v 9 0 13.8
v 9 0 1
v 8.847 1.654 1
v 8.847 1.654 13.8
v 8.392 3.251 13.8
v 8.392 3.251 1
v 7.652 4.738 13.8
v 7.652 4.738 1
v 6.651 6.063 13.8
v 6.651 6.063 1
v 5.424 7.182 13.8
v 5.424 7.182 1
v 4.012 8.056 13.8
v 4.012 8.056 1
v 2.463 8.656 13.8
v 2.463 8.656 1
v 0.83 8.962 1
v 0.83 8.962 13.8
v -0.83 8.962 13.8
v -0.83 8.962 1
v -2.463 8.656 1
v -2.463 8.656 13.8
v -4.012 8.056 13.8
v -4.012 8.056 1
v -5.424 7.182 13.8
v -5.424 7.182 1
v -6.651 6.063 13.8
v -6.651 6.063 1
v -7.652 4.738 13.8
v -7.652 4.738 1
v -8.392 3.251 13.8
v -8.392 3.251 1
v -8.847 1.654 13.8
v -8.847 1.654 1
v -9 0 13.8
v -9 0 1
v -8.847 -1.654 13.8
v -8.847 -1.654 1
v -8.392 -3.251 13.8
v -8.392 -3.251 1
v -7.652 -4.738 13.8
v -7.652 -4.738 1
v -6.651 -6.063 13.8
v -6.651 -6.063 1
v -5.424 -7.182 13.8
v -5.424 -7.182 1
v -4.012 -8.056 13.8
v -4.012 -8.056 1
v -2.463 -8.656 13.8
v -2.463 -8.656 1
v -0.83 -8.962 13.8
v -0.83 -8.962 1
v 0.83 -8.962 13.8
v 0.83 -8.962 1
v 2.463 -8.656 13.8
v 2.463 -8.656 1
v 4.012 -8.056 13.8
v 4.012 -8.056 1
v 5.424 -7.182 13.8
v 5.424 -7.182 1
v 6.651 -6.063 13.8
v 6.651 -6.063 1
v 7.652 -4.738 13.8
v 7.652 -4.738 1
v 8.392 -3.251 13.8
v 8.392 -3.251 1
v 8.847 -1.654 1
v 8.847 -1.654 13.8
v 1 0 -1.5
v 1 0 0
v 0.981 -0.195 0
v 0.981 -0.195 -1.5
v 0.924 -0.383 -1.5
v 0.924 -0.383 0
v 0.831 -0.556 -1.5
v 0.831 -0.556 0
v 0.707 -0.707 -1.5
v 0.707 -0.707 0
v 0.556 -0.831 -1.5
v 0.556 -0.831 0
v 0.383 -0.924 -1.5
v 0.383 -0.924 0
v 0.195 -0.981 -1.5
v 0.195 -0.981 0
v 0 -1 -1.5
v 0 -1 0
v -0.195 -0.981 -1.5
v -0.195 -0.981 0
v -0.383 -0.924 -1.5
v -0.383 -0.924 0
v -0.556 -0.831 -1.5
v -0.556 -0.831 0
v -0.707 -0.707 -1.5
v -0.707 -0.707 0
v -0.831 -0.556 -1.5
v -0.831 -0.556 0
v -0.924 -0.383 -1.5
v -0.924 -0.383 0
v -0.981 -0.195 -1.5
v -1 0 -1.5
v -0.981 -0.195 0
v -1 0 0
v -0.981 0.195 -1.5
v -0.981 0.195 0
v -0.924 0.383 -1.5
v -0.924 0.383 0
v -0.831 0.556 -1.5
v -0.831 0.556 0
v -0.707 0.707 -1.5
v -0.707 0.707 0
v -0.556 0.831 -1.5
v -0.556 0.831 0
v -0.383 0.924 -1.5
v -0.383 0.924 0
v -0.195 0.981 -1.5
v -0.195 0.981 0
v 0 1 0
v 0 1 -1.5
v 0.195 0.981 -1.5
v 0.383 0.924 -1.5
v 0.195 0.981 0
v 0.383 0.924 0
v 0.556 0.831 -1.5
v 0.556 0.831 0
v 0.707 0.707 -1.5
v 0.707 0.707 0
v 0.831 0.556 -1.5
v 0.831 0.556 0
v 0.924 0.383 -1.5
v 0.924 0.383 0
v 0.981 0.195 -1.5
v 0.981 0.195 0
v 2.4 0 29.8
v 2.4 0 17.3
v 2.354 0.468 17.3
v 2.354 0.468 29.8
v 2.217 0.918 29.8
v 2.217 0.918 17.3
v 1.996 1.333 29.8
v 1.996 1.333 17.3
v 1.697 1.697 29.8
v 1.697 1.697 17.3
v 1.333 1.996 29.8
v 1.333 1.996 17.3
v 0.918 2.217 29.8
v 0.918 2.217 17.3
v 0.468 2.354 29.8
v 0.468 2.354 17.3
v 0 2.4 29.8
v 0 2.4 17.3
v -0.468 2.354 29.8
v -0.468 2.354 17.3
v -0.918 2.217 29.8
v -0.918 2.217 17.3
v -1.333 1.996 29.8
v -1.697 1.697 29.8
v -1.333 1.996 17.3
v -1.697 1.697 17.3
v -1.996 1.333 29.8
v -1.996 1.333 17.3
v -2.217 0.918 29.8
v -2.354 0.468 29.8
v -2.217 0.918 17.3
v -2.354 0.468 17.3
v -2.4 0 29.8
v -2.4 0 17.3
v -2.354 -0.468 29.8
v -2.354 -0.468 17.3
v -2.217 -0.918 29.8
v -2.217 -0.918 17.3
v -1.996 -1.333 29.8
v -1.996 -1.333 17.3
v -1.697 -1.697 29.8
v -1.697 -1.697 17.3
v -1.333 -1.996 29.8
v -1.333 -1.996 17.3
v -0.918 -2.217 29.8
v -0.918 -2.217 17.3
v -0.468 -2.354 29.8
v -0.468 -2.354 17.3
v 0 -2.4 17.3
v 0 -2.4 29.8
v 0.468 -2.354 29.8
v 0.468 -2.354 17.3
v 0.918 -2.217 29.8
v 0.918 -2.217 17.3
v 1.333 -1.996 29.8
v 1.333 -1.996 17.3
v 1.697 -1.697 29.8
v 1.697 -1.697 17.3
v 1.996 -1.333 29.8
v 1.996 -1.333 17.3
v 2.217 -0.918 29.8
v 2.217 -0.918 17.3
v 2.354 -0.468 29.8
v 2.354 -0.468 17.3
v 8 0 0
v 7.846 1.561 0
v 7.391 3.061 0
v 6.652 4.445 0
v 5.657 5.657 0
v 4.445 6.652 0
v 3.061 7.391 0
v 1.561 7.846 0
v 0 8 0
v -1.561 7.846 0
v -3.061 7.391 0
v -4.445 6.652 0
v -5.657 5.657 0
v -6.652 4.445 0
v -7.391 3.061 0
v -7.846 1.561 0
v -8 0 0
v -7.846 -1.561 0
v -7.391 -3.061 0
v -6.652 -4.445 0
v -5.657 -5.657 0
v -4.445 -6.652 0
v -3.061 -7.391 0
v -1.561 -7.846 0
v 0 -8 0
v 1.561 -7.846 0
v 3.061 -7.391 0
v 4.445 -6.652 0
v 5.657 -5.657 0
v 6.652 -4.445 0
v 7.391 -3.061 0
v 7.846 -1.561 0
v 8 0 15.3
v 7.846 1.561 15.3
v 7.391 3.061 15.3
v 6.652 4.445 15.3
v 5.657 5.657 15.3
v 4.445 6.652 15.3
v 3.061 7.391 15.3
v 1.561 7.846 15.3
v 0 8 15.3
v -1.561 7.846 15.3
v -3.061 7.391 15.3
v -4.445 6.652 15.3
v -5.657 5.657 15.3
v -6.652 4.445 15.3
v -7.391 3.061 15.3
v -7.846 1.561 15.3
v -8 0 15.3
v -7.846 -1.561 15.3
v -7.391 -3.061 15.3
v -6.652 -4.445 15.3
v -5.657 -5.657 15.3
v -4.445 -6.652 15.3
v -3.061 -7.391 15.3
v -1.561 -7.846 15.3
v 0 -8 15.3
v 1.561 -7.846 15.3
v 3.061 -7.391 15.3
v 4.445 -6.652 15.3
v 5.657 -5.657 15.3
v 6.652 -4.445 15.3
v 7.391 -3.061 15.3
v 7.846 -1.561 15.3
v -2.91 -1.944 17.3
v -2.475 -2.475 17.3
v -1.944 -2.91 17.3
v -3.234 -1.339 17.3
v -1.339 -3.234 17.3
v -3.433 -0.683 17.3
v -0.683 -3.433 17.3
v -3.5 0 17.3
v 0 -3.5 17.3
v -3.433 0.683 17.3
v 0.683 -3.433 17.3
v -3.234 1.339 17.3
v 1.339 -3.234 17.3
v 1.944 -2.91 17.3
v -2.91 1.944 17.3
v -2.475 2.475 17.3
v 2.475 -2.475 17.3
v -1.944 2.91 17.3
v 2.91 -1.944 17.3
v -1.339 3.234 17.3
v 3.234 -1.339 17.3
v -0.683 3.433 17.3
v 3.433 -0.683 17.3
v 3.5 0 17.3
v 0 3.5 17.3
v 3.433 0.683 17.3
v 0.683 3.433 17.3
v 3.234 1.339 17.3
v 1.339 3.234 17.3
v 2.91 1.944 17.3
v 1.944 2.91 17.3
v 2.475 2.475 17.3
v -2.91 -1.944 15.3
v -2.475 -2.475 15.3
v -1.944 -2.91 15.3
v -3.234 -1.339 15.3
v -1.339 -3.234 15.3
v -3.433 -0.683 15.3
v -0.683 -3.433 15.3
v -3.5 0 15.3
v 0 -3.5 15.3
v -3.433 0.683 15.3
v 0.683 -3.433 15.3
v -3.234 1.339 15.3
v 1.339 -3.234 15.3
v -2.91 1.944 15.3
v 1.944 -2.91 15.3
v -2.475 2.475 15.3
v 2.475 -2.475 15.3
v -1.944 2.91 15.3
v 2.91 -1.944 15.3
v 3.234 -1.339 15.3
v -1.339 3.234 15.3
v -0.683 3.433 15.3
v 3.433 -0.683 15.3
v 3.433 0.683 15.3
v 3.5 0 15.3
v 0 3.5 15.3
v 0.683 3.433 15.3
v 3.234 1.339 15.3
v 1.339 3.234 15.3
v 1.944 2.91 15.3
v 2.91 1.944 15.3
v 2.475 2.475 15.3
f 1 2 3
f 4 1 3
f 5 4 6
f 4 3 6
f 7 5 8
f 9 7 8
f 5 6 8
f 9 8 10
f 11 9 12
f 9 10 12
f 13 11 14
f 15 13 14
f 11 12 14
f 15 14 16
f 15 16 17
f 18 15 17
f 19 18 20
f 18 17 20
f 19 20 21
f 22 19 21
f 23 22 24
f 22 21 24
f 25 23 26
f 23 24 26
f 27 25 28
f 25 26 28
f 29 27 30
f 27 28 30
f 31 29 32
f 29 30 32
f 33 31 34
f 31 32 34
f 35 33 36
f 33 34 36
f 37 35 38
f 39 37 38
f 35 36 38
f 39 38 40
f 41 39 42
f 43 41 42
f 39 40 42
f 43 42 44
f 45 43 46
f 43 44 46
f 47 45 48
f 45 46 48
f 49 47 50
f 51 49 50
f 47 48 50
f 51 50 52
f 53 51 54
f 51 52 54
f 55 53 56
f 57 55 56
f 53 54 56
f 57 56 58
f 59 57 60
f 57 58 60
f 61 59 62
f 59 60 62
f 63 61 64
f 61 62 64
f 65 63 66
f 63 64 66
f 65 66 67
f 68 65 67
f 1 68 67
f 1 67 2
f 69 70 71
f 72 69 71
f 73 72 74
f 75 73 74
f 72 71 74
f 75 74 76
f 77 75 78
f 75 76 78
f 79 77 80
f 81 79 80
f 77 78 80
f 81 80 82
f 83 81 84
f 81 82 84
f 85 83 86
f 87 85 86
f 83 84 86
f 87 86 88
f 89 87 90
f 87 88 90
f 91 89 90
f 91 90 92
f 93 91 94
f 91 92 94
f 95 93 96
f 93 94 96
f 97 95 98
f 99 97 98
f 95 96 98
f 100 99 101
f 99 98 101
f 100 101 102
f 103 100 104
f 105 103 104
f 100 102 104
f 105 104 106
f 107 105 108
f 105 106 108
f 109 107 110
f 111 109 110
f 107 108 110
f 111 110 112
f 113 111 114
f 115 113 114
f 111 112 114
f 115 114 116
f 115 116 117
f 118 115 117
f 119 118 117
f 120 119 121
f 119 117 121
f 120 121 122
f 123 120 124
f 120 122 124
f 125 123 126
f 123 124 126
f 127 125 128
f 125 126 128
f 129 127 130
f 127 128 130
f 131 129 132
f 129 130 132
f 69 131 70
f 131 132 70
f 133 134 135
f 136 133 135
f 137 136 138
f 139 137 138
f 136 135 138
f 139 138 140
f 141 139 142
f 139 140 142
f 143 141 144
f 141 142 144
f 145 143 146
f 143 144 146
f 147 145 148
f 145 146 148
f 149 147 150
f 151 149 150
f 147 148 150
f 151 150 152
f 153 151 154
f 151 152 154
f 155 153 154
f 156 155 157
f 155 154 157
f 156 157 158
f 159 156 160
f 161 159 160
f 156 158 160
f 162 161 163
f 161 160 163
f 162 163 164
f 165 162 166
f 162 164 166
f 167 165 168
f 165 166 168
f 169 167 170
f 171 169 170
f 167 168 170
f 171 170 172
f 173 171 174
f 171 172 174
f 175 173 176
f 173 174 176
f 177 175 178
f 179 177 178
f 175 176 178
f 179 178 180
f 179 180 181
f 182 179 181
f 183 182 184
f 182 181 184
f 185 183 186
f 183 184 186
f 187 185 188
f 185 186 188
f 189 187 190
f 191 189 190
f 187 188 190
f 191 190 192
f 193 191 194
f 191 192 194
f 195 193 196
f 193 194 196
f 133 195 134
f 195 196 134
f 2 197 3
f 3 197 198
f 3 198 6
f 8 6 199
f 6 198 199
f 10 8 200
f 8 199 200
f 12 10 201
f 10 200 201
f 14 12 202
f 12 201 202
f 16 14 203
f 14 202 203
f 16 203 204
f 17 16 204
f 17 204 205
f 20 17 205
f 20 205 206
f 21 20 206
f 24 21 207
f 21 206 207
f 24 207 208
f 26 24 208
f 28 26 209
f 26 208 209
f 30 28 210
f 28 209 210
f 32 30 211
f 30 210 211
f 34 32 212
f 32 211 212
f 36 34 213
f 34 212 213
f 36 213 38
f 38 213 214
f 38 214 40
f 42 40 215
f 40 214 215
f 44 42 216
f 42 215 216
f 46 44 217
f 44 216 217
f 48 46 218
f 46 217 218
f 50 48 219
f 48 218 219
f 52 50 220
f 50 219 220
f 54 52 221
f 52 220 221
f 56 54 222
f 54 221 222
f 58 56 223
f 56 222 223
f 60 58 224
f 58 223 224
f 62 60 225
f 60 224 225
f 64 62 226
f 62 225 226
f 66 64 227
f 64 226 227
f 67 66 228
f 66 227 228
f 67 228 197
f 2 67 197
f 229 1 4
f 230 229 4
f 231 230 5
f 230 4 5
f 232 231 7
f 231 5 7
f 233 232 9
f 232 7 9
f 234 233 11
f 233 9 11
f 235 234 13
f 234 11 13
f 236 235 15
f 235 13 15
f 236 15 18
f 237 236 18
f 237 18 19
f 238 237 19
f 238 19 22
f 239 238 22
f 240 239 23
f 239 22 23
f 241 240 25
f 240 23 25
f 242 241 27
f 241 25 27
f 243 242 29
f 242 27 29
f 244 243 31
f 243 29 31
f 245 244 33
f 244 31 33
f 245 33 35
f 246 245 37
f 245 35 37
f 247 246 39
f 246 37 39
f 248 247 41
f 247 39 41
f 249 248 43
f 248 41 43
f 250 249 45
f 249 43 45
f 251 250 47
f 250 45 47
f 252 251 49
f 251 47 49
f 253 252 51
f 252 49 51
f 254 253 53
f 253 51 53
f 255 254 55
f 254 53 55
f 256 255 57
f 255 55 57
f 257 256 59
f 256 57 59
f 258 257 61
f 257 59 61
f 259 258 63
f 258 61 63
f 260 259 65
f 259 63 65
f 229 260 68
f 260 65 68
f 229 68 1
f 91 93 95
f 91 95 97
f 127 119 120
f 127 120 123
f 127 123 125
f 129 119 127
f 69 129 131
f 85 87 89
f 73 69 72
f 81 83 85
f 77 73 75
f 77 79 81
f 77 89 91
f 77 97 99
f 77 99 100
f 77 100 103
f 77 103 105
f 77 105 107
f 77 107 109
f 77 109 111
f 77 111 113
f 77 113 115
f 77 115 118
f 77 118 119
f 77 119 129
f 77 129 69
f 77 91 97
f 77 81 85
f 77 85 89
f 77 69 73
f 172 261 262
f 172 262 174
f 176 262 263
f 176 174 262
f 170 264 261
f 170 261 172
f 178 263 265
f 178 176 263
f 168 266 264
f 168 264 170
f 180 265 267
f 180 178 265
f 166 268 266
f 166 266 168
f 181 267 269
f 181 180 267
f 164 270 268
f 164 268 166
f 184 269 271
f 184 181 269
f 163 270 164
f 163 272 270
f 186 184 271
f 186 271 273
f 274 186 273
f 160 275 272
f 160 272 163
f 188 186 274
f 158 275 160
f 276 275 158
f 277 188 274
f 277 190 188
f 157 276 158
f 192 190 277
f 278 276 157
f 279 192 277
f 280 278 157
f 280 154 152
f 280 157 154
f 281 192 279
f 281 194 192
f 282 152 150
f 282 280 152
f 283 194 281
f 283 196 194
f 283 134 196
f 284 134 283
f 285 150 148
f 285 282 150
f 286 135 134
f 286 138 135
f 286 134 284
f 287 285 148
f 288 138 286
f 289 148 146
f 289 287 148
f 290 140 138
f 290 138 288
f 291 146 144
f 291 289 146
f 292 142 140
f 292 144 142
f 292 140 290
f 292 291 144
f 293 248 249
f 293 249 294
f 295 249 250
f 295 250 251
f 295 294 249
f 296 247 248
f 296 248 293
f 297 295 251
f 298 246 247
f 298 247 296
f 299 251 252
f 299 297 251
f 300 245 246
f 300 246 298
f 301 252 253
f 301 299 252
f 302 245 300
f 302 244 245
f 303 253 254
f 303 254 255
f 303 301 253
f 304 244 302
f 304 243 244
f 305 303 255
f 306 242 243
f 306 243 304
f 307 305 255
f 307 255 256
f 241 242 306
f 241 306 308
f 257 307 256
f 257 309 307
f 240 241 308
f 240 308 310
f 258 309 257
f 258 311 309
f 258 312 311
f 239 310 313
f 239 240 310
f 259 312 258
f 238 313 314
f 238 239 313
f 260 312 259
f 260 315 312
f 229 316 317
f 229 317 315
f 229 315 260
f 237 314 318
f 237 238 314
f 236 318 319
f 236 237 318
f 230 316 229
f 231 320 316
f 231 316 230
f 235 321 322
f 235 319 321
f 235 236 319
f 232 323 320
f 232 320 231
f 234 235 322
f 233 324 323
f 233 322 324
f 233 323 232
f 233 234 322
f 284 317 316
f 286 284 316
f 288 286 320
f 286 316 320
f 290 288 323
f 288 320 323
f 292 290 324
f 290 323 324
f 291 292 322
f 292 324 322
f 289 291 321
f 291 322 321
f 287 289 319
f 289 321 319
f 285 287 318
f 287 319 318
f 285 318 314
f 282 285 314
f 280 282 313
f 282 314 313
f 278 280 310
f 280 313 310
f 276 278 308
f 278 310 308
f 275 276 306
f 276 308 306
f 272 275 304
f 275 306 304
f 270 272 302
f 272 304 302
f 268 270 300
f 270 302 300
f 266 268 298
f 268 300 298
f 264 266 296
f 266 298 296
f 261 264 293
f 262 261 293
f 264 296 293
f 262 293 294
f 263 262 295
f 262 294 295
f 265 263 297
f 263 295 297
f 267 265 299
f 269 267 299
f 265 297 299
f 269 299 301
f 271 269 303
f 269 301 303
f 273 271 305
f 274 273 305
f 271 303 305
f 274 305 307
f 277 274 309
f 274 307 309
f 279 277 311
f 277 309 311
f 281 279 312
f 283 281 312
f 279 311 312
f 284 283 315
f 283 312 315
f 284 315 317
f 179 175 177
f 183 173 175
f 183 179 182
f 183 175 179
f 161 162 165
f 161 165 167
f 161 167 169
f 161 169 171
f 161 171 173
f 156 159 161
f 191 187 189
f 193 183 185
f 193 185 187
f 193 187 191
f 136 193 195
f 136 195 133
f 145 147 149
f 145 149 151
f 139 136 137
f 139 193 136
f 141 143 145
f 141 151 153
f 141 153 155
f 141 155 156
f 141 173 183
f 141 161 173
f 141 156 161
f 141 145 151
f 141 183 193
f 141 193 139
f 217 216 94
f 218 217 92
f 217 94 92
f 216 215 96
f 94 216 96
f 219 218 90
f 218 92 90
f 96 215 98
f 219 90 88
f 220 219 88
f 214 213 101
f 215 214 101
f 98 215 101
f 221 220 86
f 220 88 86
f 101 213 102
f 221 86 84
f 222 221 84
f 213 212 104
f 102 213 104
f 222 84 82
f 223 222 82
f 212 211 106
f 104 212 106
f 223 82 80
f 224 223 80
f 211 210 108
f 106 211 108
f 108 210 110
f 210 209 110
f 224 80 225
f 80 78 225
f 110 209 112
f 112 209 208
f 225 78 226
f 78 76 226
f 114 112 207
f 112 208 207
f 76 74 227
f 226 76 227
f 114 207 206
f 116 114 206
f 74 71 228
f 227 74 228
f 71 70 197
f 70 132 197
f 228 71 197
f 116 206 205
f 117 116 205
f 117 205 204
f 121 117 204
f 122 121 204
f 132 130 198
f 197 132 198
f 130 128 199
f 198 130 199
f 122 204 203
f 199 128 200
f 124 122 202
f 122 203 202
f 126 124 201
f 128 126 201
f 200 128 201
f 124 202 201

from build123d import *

# Parameters (mm, degrees)
F0_R     = 9
F1_DEPTH = 15.3
F2_SIZE  = 1
F3_SIZE2 = 1.5
F3_SIZE  = 1
F4_R     = 3.5
F5_DEPTH = 2
F6_R     = 2.4
F7_DEPTH = 12.5
F8_R     = 1
F9_DEPTH = 1.5


with BuildPart() as f1:
    # F0 (on Top) → F1 (new body)
    with BuildSketch(Plane.XY):
        Circle(F0_R)
    extrude(amount=F1_DEPTH)

    # F2
    f2_edges = [f1.edges().sort_by_distance(p)[0] for p in [
        (-9, 0, 0),
    ]]
    chamfer(f2_edges, length=F2_SIZE)

    # F3
    f3_edges = [f1.edges().sort_by_distance(p)[0] for p in [
        (-9, 0, 15.3),
    ]]
    f3_side = f1.faces().sort_by_distance((0, 0, 15.3))[0]
    chamfer(f3_edges, length=F3_SIZE, length2=F3_SIZE2, reference=f3_side)

    # F4 (on face) → F5 (join)
    with BuildSketch(Plane.XY.offset(15.3)):
        Circle(F4_R)
    extrude(amount=F5_DEPTH)

    # F6 (on face) → F7 (join)
    with BuildSketch(Plane.XY.offset(17.3)):
        Circle(F6_R)
    extrude(amount=F7_DEPTH)

    # F8 (on face) → F9 (join)
    with BuildSketch(Plane(origin=(0, 0, 0), x_dir=(1, 0, 0), z_dir=(0, 0, -1))):
        Circle(F8_R)
    extrude(amount=F9_DEPTH)


solid = f1.part
